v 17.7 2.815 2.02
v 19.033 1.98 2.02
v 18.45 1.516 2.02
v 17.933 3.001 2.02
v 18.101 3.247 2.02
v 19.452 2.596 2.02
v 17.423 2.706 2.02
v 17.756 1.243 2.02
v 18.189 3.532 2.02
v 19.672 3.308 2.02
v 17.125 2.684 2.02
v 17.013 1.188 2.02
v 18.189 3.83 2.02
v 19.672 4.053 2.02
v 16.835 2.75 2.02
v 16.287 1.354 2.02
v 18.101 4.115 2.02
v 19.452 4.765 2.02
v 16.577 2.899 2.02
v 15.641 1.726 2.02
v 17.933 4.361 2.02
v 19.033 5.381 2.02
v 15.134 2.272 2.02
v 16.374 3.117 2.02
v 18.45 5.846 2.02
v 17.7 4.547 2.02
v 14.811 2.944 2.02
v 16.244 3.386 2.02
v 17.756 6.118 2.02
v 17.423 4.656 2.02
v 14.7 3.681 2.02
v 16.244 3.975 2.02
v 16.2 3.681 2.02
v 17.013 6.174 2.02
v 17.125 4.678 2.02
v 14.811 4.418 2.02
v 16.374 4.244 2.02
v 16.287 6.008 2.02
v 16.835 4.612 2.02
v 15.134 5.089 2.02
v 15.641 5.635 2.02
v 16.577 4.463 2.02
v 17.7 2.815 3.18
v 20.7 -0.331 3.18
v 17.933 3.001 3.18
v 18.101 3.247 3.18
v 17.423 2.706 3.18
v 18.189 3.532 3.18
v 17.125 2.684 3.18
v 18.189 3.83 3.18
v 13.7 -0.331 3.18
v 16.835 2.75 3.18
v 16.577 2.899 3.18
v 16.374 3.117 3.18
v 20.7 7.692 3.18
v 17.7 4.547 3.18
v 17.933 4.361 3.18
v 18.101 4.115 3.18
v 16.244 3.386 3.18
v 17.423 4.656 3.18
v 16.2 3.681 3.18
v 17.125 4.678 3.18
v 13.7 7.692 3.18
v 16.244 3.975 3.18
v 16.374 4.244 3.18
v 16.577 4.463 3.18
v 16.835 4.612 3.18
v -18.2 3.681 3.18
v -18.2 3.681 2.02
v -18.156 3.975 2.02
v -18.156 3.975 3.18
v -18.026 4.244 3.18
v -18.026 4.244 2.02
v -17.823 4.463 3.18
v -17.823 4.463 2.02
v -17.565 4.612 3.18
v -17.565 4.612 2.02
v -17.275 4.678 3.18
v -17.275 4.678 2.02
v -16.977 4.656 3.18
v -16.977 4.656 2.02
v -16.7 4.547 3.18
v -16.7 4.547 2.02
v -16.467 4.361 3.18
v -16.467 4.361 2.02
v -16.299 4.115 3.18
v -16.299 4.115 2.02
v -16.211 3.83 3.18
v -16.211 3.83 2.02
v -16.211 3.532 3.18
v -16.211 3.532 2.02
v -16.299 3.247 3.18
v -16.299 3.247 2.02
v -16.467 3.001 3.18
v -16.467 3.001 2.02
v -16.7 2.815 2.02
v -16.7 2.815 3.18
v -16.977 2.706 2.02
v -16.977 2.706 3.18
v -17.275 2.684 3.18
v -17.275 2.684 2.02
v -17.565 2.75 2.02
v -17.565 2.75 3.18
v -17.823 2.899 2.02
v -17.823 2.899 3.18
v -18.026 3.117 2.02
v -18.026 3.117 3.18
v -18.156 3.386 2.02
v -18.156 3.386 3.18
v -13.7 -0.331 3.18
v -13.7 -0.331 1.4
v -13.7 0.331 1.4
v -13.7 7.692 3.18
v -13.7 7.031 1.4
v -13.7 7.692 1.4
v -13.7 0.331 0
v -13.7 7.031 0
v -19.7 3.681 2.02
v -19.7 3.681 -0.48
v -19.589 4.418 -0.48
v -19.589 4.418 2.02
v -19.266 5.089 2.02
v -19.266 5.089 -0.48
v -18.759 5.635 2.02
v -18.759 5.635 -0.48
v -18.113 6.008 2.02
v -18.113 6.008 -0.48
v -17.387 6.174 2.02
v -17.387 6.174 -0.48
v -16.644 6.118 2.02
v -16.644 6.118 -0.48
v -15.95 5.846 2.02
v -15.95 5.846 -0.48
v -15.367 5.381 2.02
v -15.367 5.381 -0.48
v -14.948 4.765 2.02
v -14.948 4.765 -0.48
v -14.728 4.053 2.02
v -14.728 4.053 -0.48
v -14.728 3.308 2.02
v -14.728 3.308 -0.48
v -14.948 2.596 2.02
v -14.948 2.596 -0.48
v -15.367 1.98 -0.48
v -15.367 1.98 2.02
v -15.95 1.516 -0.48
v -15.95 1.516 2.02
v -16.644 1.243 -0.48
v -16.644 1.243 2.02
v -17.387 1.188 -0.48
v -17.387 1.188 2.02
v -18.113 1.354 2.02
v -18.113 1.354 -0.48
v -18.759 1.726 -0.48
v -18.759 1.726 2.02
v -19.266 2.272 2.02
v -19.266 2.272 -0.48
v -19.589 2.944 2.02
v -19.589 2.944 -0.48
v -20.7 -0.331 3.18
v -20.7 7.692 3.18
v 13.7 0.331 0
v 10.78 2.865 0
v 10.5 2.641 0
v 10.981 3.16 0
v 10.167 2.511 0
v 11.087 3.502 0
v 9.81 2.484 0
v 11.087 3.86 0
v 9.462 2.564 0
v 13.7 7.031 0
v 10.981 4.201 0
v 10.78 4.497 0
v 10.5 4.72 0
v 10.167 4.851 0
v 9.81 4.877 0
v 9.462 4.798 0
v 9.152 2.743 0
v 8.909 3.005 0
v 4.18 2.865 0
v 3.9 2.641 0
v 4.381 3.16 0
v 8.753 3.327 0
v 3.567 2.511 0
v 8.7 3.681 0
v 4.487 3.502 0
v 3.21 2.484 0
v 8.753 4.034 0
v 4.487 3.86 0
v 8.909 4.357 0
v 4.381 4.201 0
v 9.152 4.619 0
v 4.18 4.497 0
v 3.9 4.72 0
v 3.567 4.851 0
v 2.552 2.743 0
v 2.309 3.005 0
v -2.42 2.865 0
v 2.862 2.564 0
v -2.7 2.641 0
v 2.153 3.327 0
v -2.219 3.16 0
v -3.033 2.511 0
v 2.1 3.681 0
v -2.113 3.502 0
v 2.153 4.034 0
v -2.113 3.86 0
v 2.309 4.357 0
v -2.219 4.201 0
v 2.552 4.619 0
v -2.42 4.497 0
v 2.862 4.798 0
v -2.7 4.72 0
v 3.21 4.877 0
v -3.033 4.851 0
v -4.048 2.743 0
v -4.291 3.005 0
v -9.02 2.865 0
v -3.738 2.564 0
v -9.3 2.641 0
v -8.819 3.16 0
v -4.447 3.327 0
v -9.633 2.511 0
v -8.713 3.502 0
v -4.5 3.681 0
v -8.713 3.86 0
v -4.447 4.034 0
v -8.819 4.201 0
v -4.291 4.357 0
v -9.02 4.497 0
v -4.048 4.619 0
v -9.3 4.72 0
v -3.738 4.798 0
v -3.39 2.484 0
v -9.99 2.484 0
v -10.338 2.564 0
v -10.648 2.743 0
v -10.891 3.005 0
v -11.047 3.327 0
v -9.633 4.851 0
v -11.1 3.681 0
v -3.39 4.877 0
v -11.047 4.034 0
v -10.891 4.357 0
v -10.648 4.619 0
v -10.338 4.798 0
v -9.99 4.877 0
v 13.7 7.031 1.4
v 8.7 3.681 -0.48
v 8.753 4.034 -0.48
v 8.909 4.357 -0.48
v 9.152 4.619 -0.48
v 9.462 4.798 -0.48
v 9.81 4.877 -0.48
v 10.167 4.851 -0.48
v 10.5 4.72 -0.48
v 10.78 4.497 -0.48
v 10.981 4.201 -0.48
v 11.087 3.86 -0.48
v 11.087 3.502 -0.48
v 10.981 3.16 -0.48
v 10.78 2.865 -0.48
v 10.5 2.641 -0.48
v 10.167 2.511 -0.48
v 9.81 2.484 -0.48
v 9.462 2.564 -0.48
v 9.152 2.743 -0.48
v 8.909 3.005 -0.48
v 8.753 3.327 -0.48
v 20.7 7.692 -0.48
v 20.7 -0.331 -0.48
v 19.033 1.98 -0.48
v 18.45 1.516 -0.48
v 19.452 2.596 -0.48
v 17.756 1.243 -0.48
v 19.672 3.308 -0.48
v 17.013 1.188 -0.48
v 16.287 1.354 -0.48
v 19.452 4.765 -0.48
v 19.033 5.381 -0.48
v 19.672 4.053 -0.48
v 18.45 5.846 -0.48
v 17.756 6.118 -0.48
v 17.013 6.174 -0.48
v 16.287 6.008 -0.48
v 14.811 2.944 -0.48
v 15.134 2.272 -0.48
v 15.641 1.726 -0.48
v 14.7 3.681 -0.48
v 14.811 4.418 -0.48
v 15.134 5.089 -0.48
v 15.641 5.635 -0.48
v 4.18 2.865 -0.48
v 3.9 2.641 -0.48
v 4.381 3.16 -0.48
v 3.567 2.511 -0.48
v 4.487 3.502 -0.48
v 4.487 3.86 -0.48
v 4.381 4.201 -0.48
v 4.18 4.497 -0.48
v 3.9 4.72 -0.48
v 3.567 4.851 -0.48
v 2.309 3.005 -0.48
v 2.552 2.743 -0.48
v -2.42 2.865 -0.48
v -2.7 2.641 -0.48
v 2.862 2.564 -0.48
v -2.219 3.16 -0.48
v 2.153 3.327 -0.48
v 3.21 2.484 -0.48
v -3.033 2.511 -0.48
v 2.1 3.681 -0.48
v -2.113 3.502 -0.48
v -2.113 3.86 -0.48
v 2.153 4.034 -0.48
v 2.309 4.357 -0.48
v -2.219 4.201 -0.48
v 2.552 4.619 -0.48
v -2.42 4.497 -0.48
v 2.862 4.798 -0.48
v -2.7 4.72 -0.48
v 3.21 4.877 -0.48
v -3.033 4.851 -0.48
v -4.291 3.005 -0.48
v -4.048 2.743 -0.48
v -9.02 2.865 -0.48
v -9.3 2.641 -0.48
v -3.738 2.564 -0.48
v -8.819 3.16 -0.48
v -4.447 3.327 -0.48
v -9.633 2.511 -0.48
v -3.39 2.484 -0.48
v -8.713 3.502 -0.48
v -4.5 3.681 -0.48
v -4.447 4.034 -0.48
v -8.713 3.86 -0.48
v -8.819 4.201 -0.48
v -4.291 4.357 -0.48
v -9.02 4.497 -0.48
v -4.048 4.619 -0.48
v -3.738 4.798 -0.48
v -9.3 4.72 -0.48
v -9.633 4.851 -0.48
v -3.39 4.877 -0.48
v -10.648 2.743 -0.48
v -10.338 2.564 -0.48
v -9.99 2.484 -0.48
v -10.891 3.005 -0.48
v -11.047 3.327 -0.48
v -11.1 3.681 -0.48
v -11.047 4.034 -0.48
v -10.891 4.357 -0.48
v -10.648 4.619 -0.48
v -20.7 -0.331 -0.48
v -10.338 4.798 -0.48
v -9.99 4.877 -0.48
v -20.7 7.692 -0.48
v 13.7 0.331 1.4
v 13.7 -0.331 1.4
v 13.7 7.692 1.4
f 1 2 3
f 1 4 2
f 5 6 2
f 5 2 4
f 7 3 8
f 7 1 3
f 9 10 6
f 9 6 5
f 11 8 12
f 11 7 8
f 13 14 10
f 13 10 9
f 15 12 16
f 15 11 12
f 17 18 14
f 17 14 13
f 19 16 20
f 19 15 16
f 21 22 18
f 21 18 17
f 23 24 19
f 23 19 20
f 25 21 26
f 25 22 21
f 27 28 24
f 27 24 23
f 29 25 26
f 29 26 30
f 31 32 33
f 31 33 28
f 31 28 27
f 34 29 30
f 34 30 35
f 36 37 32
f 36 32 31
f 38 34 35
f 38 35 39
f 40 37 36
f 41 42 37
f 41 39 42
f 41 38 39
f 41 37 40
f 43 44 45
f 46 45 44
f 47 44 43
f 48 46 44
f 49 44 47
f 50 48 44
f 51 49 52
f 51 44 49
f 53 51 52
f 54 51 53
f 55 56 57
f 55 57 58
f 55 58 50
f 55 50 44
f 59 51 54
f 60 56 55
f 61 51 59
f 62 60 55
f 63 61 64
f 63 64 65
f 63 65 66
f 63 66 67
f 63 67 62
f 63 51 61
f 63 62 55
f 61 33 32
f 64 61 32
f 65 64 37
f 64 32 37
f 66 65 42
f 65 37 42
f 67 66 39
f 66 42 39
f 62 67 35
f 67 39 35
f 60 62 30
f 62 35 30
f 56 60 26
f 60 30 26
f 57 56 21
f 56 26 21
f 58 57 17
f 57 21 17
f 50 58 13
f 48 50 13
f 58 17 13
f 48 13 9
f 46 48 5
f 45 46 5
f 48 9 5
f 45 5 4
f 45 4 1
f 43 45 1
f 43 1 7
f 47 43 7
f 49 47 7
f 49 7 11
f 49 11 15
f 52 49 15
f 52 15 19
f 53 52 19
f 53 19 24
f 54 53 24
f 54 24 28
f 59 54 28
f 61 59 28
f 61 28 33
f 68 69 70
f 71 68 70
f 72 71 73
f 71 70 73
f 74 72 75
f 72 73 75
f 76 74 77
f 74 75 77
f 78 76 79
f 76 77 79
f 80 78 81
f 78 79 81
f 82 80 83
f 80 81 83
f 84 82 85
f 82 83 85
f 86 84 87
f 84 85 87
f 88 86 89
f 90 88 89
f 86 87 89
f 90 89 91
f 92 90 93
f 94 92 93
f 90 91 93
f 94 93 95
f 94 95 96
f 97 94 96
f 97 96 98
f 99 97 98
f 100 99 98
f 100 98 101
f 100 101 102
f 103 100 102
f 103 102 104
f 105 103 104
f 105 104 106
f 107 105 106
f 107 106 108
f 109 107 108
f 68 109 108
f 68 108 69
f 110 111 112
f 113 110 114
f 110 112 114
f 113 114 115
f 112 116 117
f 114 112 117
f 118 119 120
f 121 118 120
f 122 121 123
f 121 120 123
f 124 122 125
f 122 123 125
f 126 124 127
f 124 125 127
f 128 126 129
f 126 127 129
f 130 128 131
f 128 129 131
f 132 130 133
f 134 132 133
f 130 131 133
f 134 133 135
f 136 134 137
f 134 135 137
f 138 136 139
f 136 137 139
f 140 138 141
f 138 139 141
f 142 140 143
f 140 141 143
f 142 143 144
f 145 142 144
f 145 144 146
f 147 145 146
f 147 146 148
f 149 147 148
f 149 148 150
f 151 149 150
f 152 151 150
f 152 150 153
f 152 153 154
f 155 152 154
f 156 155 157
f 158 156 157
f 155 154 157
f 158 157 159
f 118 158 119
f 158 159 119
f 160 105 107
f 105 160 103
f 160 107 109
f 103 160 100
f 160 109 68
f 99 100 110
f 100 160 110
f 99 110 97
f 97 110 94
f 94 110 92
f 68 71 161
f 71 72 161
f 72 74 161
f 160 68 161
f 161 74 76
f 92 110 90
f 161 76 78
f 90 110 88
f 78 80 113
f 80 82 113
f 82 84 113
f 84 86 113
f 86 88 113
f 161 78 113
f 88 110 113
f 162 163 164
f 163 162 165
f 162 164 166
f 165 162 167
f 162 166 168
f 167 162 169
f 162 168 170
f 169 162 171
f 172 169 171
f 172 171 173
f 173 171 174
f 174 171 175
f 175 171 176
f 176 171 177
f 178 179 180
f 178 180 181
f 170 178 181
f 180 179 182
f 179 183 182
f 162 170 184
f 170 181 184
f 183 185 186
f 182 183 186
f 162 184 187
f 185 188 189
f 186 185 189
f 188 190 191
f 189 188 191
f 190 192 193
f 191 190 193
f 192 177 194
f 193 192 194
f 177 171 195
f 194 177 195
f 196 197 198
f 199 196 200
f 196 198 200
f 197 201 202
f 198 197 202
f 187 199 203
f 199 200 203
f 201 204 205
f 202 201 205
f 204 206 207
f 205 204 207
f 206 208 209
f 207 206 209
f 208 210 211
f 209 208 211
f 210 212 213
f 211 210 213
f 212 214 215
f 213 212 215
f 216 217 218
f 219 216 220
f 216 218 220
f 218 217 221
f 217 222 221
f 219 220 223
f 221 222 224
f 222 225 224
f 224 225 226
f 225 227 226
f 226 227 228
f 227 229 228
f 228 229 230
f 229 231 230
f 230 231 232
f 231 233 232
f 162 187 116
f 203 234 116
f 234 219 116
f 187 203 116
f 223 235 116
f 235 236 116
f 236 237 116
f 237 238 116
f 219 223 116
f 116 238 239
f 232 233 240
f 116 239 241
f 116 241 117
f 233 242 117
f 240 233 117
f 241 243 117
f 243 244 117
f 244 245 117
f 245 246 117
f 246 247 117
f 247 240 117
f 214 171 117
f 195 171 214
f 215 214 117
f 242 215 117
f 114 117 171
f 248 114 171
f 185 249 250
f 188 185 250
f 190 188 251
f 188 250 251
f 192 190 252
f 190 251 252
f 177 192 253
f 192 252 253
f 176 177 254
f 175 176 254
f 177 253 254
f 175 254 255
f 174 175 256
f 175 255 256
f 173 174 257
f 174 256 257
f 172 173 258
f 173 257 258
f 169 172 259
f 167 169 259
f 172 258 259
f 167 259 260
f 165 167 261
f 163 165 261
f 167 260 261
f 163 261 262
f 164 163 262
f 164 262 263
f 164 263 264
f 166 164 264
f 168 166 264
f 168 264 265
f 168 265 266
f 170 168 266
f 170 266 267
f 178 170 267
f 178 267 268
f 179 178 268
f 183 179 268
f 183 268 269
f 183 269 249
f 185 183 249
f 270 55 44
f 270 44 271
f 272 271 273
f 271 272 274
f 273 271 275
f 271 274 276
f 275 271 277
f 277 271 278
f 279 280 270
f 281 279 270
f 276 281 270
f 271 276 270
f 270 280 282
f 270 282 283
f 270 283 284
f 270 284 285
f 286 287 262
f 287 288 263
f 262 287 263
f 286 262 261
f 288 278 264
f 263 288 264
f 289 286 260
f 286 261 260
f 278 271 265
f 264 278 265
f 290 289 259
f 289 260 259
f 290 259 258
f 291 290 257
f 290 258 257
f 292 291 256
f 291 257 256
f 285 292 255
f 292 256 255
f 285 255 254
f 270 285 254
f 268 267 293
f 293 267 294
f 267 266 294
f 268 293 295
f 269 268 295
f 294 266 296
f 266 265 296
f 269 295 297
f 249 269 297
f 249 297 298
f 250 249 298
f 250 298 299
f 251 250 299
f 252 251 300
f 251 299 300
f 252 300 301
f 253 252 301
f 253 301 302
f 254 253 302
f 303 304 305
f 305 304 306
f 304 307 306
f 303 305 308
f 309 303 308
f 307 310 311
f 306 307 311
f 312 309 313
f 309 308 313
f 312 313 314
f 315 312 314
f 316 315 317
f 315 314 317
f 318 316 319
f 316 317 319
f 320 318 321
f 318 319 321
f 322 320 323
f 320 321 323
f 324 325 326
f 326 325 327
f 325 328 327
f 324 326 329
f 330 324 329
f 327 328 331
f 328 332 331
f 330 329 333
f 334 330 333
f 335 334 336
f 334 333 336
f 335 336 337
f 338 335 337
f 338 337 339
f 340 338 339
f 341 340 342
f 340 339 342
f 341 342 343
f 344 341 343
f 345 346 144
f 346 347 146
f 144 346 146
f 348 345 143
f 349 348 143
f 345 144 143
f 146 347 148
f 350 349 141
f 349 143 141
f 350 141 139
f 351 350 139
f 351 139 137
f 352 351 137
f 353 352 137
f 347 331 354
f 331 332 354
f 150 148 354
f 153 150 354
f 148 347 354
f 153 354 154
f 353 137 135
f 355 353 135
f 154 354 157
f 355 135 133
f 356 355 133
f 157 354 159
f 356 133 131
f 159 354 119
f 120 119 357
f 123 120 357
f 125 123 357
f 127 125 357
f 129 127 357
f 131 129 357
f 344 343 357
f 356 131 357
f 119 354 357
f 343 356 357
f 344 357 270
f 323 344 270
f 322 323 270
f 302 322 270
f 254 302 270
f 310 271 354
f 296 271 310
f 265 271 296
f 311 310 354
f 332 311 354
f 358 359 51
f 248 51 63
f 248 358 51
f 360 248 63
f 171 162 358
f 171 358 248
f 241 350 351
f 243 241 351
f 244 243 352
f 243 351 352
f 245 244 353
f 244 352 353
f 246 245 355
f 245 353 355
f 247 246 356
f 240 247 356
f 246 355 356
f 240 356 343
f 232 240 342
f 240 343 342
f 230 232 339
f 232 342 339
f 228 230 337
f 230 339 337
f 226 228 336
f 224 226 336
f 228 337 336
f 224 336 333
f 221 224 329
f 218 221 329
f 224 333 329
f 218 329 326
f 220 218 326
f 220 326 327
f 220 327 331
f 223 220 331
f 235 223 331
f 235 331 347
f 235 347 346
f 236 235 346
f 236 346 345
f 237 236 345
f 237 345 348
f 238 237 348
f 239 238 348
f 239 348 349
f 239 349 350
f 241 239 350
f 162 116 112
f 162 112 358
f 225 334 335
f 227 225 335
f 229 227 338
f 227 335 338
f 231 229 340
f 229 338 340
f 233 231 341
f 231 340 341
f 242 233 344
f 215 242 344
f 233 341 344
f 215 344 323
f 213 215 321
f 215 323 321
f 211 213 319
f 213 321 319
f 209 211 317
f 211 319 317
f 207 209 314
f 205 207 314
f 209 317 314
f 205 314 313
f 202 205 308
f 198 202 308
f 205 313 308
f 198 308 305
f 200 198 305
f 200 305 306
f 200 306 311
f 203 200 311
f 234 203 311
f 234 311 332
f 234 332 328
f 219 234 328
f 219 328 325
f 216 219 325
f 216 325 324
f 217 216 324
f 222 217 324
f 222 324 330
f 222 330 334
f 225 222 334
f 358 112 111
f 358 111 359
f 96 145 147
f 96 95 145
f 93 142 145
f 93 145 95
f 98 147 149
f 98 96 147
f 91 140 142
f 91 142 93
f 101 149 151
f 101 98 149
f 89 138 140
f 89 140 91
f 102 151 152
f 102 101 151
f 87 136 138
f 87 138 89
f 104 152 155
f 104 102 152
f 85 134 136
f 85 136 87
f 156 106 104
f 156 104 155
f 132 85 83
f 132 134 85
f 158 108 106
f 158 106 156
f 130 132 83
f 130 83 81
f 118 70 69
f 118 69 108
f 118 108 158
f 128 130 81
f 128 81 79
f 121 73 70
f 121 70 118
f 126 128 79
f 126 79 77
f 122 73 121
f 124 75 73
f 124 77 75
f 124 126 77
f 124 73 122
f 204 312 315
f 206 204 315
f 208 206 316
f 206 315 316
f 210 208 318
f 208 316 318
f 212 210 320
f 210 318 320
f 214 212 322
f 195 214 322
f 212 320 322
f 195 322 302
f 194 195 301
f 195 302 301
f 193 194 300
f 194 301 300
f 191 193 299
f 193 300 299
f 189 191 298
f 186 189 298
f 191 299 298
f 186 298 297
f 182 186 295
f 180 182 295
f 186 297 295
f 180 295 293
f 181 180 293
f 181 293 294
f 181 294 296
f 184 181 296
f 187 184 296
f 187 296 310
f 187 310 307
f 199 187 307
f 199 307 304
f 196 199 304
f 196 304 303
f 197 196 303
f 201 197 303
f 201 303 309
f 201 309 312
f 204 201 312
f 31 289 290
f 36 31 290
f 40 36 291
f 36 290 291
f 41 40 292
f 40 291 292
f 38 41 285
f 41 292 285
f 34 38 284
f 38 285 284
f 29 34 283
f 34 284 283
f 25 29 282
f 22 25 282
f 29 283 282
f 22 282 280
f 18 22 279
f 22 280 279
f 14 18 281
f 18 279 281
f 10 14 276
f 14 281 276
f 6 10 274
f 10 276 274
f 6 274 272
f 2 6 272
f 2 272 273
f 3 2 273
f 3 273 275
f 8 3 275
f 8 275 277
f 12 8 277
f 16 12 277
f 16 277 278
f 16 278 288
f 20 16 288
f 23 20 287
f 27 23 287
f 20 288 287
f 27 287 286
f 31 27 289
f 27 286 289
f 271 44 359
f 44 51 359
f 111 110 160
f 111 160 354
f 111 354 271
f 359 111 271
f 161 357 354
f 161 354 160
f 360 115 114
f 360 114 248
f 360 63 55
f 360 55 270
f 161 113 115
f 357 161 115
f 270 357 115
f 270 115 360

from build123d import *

# Parameters (mm, degrees)
SKETCH_1_W          = 27.4
SKETCH_1_H          = 6.7
EXTRUDE_1_DEPTH     = 1.4
SKETCH_2_W          = 3
SKETCH_2_H          = 8.022879097
EXTRUDE_2_DEPTH     = 1.78
SKETCH_3_W          = 33.4
SKETCH_3_H          = 8.022879097
EXTRUDE_6_DEPTH     = 0.58
SKETCH_4_R          = 1.2
CUT_EXTRUDE_1_DEPTH = 1
SKETCH_6_W          = 33.4
SKETCH_6_H          = 8.022879097
CUT_EXTRUDE_3_DEPTH = 0.1
SKETCH_7_W          = 3.66
SKETCH_7_H          = 8.022879097
EXTRUDE_7_DEPTH     = 4
SKETCH_8_R          = 2.5
CUT_EXTRUDE_4_DEPTH = 2.5
SKETCH_9_R          = 1
CUT_EXTRUDE_5_DEPTH = 5
SKETCH_10_W         = 3.66
SKETCH_10_H         = 8.022879097
EXTRUDE_8_DEPTH     = 4
SKETCH_11_R         = 2.5
CUT_EXTRUDE_6_DEPTH = 2.5
SKETCH_12_R         = 1
CUT_EXTRUDE_7_DEPTH = 2.5


with BuildPart() as part:
    # 스케치1 → 보스-돌출1 (new body)
    with BuildSketch(Plane.XY):
        Polygon((-16.7, -0.330719774), (16.7, -0.330719774), (16.7, 0.330719774), (16.7, 7.030719774), (16.7, 7.692159323), (-16.7, 7.692159323), (-16.7, 7.030719774), (-16.7, 0.330719774), align=None)
        with Locations((0, 3.680719774)):
            Rectangle(SKETCH_1_W, SKETCH_1_H, mode=Mode.SUBTRACT)
    extrude(amount=EXTRUDE_1_DEPTH)

    # 스케치2 → 보스-돌출2 (add)
    with BuildSketch(Plane.XY.offset(1.4)):
        with Locations((-15.2, 3.680719774)):
            Rectangle(SKETCH_2_W, SKETCH_2_H)
        with Locations((15.2, 3.680719774)):
            Rectangle(SKETCH_2_W, SKETCH_2_H)
    extrude(amount=EXTRUDE_2_DEPTH)

    # 스케치3 → 보스-돌출6 (add)
    with BuildSketch(Plane(origin=(0, 0, 0), x_dir=(-1, 0, 0), z_dir=(0, 0, -1))):
        with Locations((0, 3.680719774)):
            Rectangle(SKETCH_3_W, SKETCH_3_H)
    extrude(amount=EXTRUDE_6_DEPTH)

    # 스케치4 → 컷-돌출1 (cut)
    with BuildSketch(Plane(origin=(0, 0, -0.58), x_dir=(-1, 0, 0), z_dir=(0, 0, -1))):
        with Locations((-9.9, 3.680719774)):
            Circle(SKETCH_4_R)
        with Locations((-3.3, 3.680719774)):
            Circle(SKETCH_4_R)
        with Locations((3.3, 3.680719774)):
            Circle(SKETCH_4_R)
        with Locations((9.9, 3.680719774)):
            Circle(SKETCH_4_R)
    extrude(amount=-CUT_EXTRUDE_1_DEPTH, mode=Mode.SUBTRACT)

    # 스케치6 → 컷-돌출3 (cut)
    with BuildSketch(Plane(origin=(0, 0, -0.58), x_dir=(-1, 0, 0), z_dir=(0, 0, -1))):
        with Locations((0, 3.680719774)):
            Rectangle(SKETCH_6_W, SKETCH_6_H)
    extrude(amount=-CUT_EXTRUDE_3_DEPTH, mode=Mode.SUBTRACT)

    # 스케치7 → 보스-돌출7 (add)
    with BuildSketch(Plane.ZY.offset(16.7)):
        with Locations((1.35, 3.680719774)):
            Rectangle(SKETCH_7_W, SKETCH_7_H)
    extrude(amount=EXTRUDE_7_DEPTH)

    # 스케치8 → 컷-돌출4 (cut)
    with BuildSketch(Plane(origin=(0, 0, -0.48), x_dir=(-1, 0, 0), z_dir=(0, 0, -1))):
        with Locations((17.2, 3.680719774)):
            Circle(SKETCH_8_R)
    extrude(amount=-CUT_EXTRUDE_4_DEPTH, mode=Mode.SUBTRACT)

    # 스케치9 → 컷-돌출5 (cut)
    with BuildSketch(Plane(origin=(0, 0, 2.02), x_dir=(-1, 0, 0), z_dir=(0, 0, -1))):
        with Locations((17.2, 3.680719774)):
            Circle(SKETCH_9_R)
    extrude(amount=-CUT_EXTRUDE_5_DEPTH, mode=Mode.SUBTRACT)

    # 스케치10 → 보스-돌출8 (add)
    with BuildSketch(Plane(origin=(16.7, 0, 0), x_dir=(0, 0, -1), z_dir=(1, 0, 0))):
        with Locations((-1.35, 3.680719774)):
            Rectangle(SKETCH_10_W, SKETCH_10_H)
    extrude(amount=EXTRUDE_8_DEPTH)

    # 스케치11 → 컷-돌출6 (cut)
    with BuildSketch(Plane(origin=(0, 0, -0.48), x_dir=(-1, 0, 0), z_dir=(0, 0, -1))):
        with Locations((-17.2, 3.680719774)):
            Circle(SKETCH_11_R)
    extrude(amount=-CUT_EXTRUDE_6_DEPTH, mode=Mode.SUBTRACT)

    # 스케치12 → 컷-돌출7 (cut)
    with BuildSketch(Plane(origin=(0, 0, 2.02), x_dir=(-1, 0, 0), z_dir=(0, 0, -1))):
        with Locations((-17.2, 3.680719774)):
            Circle(SKETCH_12_R)
    extrude(amount=-CUT_EXTRUDE_7_DEPTH, mode=Mode.SUBTRACT)


solid = part.part
